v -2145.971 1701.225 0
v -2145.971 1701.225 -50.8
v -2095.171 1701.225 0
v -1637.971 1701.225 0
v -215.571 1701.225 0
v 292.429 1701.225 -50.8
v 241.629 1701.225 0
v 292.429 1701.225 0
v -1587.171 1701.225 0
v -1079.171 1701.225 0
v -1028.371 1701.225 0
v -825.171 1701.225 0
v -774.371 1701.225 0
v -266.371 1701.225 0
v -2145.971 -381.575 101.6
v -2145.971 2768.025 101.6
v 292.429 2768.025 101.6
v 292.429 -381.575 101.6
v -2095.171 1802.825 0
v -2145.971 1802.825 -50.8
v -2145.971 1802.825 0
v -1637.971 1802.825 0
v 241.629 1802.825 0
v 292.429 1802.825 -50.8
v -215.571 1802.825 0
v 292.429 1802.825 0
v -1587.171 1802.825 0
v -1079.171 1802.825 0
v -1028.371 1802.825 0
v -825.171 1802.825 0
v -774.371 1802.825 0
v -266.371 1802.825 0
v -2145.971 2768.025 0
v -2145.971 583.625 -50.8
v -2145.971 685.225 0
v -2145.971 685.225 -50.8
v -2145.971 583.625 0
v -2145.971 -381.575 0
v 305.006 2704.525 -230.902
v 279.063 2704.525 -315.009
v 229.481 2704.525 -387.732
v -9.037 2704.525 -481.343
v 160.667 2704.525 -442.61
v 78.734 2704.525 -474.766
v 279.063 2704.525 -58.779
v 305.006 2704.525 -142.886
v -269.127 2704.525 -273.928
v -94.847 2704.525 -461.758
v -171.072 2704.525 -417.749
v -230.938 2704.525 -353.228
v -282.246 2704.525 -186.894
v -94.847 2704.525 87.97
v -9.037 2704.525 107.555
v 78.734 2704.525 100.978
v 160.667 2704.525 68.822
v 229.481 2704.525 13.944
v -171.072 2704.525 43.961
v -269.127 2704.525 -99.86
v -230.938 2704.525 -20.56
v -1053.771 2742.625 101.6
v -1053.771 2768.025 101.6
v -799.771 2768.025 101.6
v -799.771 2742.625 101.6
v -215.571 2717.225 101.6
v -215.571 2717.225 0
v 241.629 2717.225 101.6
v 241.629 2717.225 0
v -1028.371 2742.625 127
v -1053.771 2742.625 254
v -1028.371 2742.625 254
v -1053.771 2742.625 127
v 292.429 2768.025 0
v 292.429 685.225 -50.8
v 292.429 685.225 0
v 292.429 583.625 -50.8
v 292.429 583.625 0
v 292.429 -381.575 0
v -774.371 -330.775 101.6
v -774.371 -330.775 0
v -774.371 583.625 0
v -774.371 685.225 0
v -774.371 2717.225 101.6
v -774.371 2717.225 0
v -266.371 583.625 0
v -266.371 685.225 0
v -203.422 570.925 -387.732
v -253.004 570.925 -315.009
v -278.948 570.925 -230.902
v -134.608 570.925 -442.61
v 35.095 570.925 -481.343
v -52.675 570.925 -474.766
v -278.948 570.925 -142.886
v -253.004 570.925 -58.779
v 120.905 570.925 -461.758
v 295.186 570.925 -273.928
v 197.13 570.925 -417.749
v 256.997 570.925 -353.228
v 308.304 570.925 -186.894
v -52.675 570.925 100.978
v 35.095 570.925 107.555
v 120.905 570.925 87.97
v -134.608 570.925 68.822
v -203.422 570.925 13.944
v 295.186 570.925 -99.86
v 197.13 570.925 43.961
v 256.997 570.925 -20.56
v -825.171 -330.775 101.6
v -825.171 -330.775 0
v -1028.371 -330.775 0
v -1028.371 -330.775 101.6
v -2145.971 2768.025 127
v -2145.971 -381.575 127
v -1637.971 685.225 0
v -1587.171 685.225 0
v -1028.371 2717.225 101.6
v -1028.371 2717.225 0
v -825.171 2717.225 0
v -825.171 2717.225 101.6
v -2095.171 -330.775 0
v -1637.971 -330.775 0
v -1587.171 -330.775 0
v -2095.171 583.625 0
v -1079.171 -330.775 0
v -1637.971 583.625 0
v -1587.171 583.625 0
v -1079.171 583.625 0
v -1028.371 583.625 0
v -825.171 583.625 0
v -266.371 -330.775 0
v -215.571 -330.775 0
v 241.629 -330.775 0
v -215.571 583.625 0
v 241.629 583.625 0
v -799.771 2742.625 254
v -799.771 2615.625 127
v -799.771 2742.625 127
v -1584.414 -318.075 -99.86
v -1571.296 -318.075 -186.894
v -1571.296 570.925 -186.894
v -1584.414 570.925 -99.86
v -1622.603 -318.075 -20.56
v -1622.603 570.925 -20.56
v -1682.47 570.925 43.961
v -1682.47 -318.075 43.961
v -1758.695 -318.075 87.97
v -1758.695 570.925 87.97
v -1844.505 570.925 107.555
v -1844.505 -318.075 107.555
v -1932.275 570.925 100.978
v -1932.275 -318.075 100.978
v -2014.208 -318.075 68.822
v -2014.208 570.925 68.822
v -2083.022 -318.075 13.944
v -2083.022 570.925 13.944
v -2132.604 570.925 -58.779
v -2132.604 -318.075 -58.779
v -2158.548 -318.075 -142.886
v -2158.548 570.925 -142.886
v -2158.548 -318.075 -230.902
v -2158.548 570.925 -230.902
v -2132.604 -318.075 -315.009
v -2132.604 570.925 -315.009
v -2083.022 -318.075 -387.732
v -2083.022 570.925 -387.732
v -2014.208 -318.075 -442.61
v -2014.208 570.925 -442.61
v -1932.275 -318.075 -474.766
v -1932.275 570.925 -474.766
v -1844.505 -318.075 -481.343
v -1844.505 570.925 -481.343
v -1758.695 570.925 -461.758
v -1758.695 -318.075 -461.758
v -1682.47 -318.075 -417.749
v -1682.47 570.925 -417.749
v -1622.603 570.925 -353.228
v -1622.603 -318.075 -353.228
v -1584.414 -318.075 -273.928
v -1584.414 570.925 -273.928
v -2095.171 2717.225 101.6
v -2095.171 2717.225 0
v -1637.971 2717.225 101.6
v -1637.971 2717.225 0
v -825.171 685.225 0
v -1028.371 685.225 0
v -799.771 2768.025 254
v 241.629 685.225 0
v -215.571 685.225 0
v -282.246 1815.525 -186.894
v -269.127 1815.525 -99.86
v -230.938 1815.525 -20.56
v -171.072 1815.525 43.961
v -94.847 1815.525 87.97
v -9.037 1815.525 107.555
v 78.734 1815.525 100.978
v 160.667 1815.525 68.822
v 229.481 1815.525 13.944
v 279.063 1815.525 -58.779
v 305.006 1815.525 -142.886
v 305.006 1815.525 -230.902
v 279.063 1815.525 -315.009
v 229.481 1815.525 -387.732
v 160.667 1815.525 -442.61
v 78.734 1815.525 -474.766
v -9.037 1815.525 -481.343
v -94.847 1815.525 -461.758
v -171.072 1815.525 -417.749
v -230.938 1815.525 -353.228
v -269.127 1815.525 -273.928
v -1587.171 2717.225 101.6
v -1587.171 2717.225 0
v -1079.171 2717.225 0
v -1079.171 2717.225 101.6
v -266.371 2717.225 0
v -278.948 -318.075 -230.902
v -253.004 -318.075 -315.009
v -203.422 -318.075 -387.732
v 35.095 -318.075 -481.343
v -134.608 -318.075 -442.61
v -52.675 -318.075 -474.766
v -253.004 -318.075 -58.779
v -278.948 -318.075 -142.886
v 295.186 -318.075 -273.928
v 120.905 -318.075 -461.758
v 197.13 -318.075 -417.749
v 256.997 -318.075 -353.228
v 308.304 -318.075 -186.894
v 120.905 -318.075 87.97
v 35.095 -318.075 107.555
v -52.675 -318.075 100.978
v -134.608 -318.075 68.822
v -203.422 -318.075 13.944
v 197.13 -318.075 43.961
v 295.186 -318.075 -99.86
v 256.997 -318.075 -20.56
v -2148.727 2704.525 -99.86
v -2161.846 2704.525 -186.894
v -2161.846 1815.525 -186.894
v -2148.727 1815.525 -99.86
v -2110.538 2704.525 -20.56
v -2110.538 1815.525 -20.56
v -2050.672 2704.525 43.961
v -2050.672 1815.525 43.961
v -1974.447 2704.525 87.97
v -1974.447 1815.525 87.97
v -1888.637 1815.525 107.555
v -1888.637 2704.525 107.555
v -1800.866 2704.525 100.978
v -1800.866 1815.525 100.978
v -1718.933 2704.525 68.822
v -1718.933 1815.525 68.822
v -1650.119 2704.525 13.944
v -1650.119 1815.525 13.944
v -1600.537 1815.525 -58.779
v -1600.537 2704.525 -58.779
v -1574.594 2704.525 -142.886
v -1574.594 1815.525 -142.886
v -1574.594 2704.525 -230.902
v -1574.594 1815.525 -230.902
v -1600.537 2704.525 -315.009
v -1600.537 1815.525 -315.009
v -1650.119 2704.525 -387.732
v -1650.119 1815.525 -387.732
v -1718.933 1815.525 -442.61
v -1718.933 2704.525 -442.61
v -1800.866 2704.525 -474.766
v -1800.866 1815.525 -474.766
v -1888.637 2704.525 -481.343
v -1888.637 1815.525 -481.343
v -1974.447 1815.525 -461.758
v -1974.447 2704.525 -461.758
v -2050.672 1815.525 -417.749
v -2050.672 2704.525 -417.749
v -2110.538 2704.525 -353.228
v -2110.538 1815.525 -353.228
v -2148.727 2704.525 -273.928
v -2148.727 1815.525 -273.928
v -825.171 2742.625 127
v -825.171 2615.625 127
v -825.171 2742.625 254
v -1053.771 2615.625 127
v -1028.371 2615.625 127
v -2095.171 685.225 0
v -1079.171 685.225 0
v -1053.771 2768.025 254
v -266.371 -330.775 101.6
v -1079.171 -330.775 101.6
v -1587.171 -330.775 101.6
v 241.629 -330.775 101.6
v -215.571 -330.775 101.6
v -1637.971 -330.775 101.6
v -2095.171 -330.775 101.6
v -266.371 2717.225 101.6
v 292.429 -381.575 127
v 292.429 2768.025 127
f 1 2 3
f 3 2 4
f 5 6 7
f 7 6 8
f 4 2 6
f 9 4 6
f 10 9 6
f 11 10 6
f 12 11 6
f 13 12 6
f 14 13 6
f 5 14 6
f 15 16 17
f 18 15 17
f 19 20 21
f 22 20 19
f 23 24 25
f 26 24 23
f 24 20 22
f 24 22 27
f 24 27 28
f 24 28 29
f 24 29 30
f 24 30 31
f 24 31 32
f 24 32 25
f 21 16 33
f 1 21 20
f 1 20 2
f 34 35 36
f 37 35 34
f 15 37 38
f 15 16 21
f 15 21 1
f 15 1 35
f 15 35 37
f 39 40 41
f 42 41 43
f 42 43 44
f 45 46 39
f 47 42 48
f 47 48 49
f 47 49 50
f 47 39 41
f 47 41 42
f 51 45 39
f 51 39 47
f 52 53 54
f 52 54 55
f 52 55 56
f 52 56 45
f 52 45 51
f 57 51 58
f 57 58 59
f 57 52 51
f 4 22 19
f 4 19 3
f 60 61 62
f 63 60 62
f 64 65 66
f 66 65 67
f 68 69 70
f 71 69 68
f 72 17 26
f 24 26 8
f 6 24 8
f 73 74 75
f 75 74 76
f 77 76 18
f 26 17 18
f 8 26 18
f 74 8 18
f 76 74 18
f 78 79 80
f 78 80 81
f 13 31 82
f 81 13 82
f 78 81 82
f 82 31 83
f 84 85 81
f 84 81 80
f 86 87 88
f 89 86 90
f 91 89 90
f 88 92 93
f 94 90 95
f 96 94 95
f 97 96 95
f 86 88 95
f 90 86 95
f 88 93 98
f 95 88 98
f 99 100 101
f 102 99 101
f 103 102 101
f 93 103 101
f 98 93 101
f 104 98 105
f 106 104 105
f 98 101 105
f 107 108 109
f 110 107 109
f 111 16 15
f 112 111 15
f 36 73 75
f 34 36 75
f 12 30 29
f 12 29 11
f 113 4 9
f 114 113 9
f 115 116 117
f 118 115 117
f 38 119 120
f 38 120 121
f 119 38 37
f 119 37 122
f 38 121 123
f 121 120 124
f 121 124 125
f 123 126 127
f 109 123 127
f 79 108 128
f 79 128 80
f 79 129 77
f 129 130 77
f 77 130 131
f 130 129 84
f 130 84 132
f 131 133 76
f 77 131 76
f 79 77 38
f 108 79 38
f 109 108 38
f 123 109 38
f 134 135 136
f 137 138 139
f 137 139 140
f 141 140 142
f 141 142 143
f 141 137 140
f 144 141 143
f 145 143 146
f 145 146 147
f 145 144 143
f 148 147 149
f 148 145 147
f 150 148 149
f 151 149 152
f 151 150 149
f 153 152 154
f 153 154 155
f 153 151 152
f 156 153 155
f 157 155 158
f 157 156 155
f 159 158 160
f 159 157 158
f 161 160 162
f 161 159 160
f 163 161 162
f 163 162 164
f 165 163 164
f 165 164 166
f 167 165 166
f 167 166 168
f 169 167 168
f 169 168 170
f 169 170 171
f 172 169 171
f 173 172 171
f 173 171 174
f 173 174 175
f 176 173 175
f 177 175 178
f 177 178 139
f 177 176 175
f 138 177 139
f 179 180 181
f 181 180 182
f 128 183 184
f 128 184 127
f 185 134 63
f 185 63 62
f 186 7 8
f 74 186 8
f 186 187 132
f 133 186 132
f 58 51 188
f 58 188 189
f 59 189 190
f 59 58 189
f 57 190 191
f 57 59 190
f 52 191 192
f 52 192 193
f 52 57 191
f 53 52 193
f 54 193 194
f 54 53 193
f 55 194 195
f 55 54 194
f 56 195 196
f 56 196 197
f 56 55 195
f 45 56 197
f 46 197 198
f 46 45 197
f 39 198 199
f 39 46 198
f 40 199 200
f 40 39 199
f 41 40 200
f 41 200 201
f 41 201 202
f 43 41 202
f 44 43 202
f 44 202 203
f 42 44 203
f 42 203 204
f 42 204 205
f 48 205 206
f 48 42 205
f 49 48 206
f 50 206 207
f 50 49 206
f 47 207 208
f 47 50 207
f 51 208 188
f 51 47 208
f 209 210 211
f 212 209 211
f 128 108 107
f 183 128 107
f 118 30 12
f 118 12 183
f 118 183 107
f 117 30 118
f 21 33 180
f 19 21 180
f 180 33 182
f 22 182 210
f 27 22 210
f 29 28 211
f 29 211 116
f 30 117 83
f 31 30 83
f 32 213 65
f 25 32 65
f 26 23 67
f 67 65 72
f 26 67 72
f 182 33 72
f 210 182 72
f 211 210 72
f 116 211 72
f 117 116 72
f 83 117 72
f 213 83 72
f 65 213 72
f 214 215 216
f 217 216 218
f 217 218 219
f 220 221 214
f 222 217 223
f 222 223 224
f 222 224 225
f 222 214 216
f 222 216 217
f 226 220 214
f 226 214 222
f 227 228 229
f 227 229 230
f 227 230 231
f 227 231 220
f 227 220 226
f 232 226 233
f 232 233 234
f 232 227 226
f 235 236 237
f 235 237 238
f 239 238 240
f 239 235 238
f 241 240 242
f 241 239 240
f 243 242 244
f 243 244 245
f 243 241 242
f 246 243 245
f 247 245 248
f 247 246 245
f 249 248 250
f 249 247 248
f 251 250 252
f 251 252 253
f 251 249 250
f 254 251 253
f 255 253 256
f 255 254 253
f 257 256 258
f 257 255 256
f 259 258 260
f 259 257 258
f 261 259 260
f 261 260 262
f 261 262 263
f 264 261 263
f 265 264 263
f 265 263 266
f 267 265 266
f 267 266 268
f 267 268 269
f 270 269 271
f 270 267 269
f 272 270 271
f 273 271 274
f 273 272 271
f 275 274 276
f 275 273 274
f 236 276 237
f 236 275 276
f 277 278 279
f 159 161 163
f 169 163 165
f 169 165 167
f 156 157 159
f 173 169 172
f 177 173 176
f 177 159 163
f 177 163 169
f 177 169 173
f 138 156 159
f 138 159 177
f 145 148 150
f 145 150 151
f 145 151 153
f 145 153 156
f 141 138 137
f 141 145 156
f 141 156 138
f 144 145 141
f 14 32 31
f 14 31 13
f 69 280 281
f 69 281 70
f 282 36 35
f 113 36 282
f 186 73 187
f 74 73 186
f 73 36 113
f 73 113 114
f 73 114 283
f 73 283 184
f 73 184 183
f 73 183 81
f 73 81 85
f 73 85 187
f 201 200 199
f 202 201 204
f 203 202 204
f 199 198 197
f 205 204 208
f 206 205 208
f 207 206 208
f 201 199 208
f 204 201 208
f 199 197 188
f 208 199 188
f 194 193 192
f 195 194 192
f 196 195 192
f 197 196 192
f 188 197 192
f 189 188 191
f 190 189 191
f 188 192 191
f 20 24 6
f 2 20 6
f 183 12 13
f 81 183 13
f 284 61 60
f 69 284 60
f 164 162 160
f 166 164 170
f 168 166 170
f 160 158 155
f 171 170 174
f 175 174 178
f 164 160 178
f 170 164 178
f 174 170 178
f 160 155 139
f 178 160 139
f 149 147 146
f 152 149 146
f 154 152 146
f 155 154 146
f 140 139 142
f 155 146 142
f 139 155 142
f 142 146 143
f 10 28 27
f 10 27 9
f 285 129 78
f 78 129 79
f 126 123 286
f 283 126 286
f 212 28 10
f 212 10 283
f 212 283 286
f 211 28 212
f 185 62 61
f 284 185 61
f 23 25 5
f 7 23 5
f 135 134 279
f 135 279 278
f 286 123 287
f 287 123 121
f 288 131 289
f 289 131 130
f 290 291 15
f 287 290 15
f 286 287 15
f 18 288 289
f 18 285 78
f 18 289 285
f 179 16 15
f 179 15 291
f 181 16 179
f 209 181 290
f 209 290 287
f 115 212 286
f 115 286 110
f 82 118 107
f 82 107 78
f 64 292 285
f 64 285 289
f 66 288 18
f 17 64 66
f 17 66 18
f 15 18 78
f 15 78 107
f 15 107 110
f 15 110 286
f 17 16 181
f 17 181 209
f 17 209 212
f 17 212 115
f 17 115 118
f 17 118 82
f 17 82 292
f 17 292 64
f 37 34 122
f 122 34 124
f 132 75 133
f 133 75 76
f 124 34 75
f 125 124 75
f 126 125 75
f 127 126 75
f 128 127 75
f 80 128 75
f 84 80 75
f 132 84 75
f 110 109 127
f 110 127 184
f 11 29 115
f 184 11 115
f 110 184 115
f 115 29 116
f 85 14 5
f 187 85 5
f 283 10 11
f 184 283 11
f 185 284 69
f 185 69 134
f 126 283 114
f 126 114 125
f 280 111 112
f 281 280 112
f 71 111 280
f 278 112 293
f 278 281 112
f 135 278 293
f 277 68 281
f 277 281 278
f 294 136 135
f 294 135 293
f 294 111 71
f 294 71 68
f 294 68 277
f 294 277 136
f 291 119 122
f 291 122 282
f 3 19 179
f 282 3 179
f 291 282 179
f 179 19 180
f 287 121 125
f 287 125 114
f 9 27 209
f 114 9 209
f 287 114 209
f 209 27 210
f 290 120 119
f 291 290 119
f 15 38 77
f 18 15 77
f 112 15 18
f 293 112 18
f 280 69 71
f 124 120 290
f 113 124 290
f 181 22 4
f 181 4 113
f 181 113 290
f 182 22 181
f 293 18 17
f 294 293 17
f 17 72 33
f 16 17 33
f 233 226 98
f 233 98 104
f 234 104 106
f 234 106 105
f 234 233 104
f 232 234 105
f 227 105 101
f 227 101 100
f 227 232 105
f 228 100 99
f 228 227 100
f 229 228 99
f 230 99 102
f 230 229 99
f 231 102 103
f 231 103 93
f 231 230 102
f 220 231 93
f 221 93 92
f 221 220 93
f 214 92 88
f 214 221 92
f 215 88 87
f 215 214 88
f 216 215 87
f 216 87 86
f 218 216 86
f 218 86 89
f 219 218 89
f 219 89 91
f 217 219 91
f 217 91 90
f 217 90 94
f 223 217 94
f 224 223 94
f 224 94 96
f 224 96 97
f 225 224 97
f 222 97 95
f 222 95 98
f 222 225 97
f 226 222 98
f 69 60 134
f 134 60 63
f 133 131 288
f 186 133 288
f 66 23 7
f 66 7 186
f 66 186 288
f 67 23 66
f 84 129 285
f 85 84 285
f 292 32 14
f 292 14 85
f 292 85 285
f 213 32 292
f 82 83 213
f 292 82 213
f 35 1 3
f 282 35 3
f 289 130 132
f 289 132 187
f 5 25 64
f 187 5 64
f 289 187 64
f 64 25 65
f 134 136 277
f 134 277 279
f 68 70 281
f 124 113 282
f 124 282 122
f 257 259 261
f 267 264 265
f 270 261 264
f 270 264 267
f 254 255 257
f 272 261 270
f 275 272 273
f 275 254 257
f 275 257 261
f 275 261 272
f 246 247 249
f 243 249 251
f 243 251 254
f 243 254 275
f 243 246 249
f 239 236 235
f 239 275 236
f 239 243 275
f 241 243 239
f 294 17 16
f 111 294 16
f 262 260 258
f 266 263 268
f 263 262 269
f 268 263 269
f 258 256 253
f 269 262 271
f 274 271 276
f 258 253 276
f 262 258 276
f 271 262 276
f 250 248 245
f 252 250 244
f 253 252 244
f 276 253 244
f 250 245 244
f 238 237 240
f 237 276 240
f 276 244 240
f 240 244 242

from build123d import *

# Parameters (mm, degrees)
F0_W      = 50.8
F0_H      = 3048
F1_DEPTH  = 101.6
F6_W      = 101.6
F6_H      = 50.8
F7_DEPTH  = 2438.4
F5_R      = 295.275
F8_DEPTH  = 889
F9_R      = 295.275
F10_DEPTH = 889
F12_W     = 127
F12_H     = 25.4
F13_DEPTH = 25.4
F14_DEPTH = 152.4
F16_DEPTH = 25.4
F18_DEPTH = 25.4


with BuildPart() as f1:
    # F0 (on Top) → F1 (new body)
    with BuildSketch(Plane.XY):
        Polygon((-2145.970582962, 2768.0247317466), (-2145.970582962, 2717.2247317466), (-2095.170582962, 2717.2247317466), (-1637.970582962, 2717.2247317466), (-1587.170582962, 2717.2247317466), (-1079.170582962, 2717.2247317466), (-1028.370582962, 2717.2247317466), (-825.170582962, 2717.2247317466), (-774.370582962, 2717.2247317466), (-266.370582962, 2717.2247317466), (-215.570582962, 2717.2247317466), (241.629417038, 2717.2247317466), (292.429417038, 2717.2247317466), (292.429417038, 2768.0247317466), align=None)
        with Locations((-2120.570582962, 1193.2247317466)):
            Rectangle(F0_W, F0_H)
        Polygon((-2095.170582962, -330.7752682534), (-2145.970582962, -330.7752682534), (-2145.970582962, -381.5752682534), (292.429417038, -381.5752682534), (292.429417038, -330.7752682534), (241.629417038, -330.7752682534), (-215.570582962, -330.7752682534), (-266.370582962, -330.7752682534), (-774.370582962, -330.7752682534), (-825.170582962, -330.7752682534), (-1028.370582962, -330.7752682534), (-1079.170582962, -330.7752682534), (-1587.170582962, -330.7752682534), (-1637.970582962, -330.7752682534), align=None)
        with Locations((267.029417038, 1193.2247317466)):
            Rectangle(F0_W, F0_H)
        with Locations((-1612.570582962, 1193.2247317466)):
            Rectangle(F0_W, F0_H)
        with Locations((-1053.770582962, 1193.2247317466)):
            Rectangle(F0_W, F0_H)
        with Locations((-799.770582962, 1193.2247317466)):
            Rectangle(F0_W, F0_H)
        with Locations((-240.970582962, 1193.2247317466)):
            Rectangle(F0_W, F0_H)
    extrude(amount=F1_DEPTH)

    # F6 (on offset) → F7 (join)
    with BuildSketch(Plane(origin=(292.429417038, 0, 0), x_dir=(0, -1, 0), z_dir=(-1, 0, 0))):
        with Locations((-634.4247317466, -25.4)):
            Rectangle(F6_W, F6_H)
        with Locations((-1752.0247317466, -25.4)):
            Rectangle(F6_W, F6_H)
    extrude(amount=F7_DEPTH)


with BuildPart() as f8:
    # F5 (on offset) → F8 (new body)
    with BuildSketch(Plane.XZ.offset(318.0752682534)):
        with Locations((13.029417038, -186.8939956901)):
            Circle(F5_R)
    extrude(amount=-F8_DEPTH)


with BuildPart() as f8b:
    # F5 (on offset) → F8, piece 2 (new body)
    with BuildSketch(Plane.XZ.offset(318.0752682534)):
        with Locations((-1866.570582962, -186.8939956901)):
            Circle(F5_R)
    extrude(amount=-F8_DEPTH)


with BuildPart() as f10:
    # F9 (on offset) → F10 (new body)
    with BuildSketch(Plane(origin=(0, 2704.5247317466, 0), x_dir=(-1, 0, 0), z_dir=(0, 1, 0))):
        with Locations((-13.029417038, -186.8939956901)):
            Circle(F9_R)
    extrude(amount=-F10_DEPTH)


with BuildPart() as f10b:
    # F9 (on offset) → F10, piece 2 (new body)
    with BuildSketch(Plane(origin=(0, 2704.5247317466, 0), x_dir=(-1, 0, 0), z_dir=(0, 1, 0))):
        with Locations((1866.570582962, -186.8939956901)):
            Circle(F9_R)
    extrude(amount=-F10_DEPTH)


with BuildPart() as f13:
    # F12 (on offset) → F13 (new body)
    with BuildSketch(Plane.XY.offset(101.6)):
        Polygon((-1053.770582962, 2768.0247317466), (-2145.970582962, 2768.0247317466), (-2145.970582962, -381.5752682534), (-926.770582962, -381.5752682534), (-926.770582962, 2742.6247317466), (-1053.770582962, 2742.6247317466), align=None)
        Polygon((-1028.370582962, 2768.0247317466), (-1053.770582962, 2768.0247317466), (-1053.770582962, 2742.6247317466), (-926.770582962, 2742.6247317466), (-926.770582962, 2768.0247317466), align=None)
        Polygon((-926.770582962, 2742.6247317466), (-926.770582962, -381.5752682534), (292.429417038, -381.5752682534), (292.429417038, 2768.0247317466), (-799.770582962, 2768.0247317466), (-799.770582962, 2742.6247317466), align=None)
        with Locations((-863.270582962, 2755.3247317466)):
            Rectangle(F12_W, F12_H)
    extrude(amount=F13_DEPTH)

    # F15 (on face) → F16 (join)
    with BuildSketch(Plane.YZ.offset(-799.770582962)):
        Polygon((2742.6247317466, 127), (2742.6247317466, 254), (2615.6247317466, 127), align=None)
    extrude(amount=-F16_DEPTH)

    # F17 (on face) → F18 (join)
    with BuildSketch(Plane(origin=(-1053.770582962, 0, 0), x_dir=(0, -1, 0), z_dir=(-1, 0, 0))):
        Polygon((-2742.6247317466, 127), (-2615.6247317466, 127), (-2742.6247317466, 254), align=None)
    extrude(amount=-F18_DEPTH)


with BuildPart() as f14:
    # F12 (on offset) → F14 (new body)
    with BuildSketch(Plane.XY.offset(101.6)):
        Polygon((-1028.370582962, 2768.0247317466), (-1053.770582962, 2768.0247317466), (-1053.770582962, 2742.6247317466), (-926.770582962, 2742.6247317466), (-926.770582962, 2768.0247317466), align=None)
        with Locations((-863.270582962, 2755.3247317466)):
            Rectangle(F12_W, F12_H)
    extrude(amount=F14_DEPTH)


solid = Compound([f1.part, f8.part, f8b.part, f10.part, f10b.part, f13.part, f14.part])
